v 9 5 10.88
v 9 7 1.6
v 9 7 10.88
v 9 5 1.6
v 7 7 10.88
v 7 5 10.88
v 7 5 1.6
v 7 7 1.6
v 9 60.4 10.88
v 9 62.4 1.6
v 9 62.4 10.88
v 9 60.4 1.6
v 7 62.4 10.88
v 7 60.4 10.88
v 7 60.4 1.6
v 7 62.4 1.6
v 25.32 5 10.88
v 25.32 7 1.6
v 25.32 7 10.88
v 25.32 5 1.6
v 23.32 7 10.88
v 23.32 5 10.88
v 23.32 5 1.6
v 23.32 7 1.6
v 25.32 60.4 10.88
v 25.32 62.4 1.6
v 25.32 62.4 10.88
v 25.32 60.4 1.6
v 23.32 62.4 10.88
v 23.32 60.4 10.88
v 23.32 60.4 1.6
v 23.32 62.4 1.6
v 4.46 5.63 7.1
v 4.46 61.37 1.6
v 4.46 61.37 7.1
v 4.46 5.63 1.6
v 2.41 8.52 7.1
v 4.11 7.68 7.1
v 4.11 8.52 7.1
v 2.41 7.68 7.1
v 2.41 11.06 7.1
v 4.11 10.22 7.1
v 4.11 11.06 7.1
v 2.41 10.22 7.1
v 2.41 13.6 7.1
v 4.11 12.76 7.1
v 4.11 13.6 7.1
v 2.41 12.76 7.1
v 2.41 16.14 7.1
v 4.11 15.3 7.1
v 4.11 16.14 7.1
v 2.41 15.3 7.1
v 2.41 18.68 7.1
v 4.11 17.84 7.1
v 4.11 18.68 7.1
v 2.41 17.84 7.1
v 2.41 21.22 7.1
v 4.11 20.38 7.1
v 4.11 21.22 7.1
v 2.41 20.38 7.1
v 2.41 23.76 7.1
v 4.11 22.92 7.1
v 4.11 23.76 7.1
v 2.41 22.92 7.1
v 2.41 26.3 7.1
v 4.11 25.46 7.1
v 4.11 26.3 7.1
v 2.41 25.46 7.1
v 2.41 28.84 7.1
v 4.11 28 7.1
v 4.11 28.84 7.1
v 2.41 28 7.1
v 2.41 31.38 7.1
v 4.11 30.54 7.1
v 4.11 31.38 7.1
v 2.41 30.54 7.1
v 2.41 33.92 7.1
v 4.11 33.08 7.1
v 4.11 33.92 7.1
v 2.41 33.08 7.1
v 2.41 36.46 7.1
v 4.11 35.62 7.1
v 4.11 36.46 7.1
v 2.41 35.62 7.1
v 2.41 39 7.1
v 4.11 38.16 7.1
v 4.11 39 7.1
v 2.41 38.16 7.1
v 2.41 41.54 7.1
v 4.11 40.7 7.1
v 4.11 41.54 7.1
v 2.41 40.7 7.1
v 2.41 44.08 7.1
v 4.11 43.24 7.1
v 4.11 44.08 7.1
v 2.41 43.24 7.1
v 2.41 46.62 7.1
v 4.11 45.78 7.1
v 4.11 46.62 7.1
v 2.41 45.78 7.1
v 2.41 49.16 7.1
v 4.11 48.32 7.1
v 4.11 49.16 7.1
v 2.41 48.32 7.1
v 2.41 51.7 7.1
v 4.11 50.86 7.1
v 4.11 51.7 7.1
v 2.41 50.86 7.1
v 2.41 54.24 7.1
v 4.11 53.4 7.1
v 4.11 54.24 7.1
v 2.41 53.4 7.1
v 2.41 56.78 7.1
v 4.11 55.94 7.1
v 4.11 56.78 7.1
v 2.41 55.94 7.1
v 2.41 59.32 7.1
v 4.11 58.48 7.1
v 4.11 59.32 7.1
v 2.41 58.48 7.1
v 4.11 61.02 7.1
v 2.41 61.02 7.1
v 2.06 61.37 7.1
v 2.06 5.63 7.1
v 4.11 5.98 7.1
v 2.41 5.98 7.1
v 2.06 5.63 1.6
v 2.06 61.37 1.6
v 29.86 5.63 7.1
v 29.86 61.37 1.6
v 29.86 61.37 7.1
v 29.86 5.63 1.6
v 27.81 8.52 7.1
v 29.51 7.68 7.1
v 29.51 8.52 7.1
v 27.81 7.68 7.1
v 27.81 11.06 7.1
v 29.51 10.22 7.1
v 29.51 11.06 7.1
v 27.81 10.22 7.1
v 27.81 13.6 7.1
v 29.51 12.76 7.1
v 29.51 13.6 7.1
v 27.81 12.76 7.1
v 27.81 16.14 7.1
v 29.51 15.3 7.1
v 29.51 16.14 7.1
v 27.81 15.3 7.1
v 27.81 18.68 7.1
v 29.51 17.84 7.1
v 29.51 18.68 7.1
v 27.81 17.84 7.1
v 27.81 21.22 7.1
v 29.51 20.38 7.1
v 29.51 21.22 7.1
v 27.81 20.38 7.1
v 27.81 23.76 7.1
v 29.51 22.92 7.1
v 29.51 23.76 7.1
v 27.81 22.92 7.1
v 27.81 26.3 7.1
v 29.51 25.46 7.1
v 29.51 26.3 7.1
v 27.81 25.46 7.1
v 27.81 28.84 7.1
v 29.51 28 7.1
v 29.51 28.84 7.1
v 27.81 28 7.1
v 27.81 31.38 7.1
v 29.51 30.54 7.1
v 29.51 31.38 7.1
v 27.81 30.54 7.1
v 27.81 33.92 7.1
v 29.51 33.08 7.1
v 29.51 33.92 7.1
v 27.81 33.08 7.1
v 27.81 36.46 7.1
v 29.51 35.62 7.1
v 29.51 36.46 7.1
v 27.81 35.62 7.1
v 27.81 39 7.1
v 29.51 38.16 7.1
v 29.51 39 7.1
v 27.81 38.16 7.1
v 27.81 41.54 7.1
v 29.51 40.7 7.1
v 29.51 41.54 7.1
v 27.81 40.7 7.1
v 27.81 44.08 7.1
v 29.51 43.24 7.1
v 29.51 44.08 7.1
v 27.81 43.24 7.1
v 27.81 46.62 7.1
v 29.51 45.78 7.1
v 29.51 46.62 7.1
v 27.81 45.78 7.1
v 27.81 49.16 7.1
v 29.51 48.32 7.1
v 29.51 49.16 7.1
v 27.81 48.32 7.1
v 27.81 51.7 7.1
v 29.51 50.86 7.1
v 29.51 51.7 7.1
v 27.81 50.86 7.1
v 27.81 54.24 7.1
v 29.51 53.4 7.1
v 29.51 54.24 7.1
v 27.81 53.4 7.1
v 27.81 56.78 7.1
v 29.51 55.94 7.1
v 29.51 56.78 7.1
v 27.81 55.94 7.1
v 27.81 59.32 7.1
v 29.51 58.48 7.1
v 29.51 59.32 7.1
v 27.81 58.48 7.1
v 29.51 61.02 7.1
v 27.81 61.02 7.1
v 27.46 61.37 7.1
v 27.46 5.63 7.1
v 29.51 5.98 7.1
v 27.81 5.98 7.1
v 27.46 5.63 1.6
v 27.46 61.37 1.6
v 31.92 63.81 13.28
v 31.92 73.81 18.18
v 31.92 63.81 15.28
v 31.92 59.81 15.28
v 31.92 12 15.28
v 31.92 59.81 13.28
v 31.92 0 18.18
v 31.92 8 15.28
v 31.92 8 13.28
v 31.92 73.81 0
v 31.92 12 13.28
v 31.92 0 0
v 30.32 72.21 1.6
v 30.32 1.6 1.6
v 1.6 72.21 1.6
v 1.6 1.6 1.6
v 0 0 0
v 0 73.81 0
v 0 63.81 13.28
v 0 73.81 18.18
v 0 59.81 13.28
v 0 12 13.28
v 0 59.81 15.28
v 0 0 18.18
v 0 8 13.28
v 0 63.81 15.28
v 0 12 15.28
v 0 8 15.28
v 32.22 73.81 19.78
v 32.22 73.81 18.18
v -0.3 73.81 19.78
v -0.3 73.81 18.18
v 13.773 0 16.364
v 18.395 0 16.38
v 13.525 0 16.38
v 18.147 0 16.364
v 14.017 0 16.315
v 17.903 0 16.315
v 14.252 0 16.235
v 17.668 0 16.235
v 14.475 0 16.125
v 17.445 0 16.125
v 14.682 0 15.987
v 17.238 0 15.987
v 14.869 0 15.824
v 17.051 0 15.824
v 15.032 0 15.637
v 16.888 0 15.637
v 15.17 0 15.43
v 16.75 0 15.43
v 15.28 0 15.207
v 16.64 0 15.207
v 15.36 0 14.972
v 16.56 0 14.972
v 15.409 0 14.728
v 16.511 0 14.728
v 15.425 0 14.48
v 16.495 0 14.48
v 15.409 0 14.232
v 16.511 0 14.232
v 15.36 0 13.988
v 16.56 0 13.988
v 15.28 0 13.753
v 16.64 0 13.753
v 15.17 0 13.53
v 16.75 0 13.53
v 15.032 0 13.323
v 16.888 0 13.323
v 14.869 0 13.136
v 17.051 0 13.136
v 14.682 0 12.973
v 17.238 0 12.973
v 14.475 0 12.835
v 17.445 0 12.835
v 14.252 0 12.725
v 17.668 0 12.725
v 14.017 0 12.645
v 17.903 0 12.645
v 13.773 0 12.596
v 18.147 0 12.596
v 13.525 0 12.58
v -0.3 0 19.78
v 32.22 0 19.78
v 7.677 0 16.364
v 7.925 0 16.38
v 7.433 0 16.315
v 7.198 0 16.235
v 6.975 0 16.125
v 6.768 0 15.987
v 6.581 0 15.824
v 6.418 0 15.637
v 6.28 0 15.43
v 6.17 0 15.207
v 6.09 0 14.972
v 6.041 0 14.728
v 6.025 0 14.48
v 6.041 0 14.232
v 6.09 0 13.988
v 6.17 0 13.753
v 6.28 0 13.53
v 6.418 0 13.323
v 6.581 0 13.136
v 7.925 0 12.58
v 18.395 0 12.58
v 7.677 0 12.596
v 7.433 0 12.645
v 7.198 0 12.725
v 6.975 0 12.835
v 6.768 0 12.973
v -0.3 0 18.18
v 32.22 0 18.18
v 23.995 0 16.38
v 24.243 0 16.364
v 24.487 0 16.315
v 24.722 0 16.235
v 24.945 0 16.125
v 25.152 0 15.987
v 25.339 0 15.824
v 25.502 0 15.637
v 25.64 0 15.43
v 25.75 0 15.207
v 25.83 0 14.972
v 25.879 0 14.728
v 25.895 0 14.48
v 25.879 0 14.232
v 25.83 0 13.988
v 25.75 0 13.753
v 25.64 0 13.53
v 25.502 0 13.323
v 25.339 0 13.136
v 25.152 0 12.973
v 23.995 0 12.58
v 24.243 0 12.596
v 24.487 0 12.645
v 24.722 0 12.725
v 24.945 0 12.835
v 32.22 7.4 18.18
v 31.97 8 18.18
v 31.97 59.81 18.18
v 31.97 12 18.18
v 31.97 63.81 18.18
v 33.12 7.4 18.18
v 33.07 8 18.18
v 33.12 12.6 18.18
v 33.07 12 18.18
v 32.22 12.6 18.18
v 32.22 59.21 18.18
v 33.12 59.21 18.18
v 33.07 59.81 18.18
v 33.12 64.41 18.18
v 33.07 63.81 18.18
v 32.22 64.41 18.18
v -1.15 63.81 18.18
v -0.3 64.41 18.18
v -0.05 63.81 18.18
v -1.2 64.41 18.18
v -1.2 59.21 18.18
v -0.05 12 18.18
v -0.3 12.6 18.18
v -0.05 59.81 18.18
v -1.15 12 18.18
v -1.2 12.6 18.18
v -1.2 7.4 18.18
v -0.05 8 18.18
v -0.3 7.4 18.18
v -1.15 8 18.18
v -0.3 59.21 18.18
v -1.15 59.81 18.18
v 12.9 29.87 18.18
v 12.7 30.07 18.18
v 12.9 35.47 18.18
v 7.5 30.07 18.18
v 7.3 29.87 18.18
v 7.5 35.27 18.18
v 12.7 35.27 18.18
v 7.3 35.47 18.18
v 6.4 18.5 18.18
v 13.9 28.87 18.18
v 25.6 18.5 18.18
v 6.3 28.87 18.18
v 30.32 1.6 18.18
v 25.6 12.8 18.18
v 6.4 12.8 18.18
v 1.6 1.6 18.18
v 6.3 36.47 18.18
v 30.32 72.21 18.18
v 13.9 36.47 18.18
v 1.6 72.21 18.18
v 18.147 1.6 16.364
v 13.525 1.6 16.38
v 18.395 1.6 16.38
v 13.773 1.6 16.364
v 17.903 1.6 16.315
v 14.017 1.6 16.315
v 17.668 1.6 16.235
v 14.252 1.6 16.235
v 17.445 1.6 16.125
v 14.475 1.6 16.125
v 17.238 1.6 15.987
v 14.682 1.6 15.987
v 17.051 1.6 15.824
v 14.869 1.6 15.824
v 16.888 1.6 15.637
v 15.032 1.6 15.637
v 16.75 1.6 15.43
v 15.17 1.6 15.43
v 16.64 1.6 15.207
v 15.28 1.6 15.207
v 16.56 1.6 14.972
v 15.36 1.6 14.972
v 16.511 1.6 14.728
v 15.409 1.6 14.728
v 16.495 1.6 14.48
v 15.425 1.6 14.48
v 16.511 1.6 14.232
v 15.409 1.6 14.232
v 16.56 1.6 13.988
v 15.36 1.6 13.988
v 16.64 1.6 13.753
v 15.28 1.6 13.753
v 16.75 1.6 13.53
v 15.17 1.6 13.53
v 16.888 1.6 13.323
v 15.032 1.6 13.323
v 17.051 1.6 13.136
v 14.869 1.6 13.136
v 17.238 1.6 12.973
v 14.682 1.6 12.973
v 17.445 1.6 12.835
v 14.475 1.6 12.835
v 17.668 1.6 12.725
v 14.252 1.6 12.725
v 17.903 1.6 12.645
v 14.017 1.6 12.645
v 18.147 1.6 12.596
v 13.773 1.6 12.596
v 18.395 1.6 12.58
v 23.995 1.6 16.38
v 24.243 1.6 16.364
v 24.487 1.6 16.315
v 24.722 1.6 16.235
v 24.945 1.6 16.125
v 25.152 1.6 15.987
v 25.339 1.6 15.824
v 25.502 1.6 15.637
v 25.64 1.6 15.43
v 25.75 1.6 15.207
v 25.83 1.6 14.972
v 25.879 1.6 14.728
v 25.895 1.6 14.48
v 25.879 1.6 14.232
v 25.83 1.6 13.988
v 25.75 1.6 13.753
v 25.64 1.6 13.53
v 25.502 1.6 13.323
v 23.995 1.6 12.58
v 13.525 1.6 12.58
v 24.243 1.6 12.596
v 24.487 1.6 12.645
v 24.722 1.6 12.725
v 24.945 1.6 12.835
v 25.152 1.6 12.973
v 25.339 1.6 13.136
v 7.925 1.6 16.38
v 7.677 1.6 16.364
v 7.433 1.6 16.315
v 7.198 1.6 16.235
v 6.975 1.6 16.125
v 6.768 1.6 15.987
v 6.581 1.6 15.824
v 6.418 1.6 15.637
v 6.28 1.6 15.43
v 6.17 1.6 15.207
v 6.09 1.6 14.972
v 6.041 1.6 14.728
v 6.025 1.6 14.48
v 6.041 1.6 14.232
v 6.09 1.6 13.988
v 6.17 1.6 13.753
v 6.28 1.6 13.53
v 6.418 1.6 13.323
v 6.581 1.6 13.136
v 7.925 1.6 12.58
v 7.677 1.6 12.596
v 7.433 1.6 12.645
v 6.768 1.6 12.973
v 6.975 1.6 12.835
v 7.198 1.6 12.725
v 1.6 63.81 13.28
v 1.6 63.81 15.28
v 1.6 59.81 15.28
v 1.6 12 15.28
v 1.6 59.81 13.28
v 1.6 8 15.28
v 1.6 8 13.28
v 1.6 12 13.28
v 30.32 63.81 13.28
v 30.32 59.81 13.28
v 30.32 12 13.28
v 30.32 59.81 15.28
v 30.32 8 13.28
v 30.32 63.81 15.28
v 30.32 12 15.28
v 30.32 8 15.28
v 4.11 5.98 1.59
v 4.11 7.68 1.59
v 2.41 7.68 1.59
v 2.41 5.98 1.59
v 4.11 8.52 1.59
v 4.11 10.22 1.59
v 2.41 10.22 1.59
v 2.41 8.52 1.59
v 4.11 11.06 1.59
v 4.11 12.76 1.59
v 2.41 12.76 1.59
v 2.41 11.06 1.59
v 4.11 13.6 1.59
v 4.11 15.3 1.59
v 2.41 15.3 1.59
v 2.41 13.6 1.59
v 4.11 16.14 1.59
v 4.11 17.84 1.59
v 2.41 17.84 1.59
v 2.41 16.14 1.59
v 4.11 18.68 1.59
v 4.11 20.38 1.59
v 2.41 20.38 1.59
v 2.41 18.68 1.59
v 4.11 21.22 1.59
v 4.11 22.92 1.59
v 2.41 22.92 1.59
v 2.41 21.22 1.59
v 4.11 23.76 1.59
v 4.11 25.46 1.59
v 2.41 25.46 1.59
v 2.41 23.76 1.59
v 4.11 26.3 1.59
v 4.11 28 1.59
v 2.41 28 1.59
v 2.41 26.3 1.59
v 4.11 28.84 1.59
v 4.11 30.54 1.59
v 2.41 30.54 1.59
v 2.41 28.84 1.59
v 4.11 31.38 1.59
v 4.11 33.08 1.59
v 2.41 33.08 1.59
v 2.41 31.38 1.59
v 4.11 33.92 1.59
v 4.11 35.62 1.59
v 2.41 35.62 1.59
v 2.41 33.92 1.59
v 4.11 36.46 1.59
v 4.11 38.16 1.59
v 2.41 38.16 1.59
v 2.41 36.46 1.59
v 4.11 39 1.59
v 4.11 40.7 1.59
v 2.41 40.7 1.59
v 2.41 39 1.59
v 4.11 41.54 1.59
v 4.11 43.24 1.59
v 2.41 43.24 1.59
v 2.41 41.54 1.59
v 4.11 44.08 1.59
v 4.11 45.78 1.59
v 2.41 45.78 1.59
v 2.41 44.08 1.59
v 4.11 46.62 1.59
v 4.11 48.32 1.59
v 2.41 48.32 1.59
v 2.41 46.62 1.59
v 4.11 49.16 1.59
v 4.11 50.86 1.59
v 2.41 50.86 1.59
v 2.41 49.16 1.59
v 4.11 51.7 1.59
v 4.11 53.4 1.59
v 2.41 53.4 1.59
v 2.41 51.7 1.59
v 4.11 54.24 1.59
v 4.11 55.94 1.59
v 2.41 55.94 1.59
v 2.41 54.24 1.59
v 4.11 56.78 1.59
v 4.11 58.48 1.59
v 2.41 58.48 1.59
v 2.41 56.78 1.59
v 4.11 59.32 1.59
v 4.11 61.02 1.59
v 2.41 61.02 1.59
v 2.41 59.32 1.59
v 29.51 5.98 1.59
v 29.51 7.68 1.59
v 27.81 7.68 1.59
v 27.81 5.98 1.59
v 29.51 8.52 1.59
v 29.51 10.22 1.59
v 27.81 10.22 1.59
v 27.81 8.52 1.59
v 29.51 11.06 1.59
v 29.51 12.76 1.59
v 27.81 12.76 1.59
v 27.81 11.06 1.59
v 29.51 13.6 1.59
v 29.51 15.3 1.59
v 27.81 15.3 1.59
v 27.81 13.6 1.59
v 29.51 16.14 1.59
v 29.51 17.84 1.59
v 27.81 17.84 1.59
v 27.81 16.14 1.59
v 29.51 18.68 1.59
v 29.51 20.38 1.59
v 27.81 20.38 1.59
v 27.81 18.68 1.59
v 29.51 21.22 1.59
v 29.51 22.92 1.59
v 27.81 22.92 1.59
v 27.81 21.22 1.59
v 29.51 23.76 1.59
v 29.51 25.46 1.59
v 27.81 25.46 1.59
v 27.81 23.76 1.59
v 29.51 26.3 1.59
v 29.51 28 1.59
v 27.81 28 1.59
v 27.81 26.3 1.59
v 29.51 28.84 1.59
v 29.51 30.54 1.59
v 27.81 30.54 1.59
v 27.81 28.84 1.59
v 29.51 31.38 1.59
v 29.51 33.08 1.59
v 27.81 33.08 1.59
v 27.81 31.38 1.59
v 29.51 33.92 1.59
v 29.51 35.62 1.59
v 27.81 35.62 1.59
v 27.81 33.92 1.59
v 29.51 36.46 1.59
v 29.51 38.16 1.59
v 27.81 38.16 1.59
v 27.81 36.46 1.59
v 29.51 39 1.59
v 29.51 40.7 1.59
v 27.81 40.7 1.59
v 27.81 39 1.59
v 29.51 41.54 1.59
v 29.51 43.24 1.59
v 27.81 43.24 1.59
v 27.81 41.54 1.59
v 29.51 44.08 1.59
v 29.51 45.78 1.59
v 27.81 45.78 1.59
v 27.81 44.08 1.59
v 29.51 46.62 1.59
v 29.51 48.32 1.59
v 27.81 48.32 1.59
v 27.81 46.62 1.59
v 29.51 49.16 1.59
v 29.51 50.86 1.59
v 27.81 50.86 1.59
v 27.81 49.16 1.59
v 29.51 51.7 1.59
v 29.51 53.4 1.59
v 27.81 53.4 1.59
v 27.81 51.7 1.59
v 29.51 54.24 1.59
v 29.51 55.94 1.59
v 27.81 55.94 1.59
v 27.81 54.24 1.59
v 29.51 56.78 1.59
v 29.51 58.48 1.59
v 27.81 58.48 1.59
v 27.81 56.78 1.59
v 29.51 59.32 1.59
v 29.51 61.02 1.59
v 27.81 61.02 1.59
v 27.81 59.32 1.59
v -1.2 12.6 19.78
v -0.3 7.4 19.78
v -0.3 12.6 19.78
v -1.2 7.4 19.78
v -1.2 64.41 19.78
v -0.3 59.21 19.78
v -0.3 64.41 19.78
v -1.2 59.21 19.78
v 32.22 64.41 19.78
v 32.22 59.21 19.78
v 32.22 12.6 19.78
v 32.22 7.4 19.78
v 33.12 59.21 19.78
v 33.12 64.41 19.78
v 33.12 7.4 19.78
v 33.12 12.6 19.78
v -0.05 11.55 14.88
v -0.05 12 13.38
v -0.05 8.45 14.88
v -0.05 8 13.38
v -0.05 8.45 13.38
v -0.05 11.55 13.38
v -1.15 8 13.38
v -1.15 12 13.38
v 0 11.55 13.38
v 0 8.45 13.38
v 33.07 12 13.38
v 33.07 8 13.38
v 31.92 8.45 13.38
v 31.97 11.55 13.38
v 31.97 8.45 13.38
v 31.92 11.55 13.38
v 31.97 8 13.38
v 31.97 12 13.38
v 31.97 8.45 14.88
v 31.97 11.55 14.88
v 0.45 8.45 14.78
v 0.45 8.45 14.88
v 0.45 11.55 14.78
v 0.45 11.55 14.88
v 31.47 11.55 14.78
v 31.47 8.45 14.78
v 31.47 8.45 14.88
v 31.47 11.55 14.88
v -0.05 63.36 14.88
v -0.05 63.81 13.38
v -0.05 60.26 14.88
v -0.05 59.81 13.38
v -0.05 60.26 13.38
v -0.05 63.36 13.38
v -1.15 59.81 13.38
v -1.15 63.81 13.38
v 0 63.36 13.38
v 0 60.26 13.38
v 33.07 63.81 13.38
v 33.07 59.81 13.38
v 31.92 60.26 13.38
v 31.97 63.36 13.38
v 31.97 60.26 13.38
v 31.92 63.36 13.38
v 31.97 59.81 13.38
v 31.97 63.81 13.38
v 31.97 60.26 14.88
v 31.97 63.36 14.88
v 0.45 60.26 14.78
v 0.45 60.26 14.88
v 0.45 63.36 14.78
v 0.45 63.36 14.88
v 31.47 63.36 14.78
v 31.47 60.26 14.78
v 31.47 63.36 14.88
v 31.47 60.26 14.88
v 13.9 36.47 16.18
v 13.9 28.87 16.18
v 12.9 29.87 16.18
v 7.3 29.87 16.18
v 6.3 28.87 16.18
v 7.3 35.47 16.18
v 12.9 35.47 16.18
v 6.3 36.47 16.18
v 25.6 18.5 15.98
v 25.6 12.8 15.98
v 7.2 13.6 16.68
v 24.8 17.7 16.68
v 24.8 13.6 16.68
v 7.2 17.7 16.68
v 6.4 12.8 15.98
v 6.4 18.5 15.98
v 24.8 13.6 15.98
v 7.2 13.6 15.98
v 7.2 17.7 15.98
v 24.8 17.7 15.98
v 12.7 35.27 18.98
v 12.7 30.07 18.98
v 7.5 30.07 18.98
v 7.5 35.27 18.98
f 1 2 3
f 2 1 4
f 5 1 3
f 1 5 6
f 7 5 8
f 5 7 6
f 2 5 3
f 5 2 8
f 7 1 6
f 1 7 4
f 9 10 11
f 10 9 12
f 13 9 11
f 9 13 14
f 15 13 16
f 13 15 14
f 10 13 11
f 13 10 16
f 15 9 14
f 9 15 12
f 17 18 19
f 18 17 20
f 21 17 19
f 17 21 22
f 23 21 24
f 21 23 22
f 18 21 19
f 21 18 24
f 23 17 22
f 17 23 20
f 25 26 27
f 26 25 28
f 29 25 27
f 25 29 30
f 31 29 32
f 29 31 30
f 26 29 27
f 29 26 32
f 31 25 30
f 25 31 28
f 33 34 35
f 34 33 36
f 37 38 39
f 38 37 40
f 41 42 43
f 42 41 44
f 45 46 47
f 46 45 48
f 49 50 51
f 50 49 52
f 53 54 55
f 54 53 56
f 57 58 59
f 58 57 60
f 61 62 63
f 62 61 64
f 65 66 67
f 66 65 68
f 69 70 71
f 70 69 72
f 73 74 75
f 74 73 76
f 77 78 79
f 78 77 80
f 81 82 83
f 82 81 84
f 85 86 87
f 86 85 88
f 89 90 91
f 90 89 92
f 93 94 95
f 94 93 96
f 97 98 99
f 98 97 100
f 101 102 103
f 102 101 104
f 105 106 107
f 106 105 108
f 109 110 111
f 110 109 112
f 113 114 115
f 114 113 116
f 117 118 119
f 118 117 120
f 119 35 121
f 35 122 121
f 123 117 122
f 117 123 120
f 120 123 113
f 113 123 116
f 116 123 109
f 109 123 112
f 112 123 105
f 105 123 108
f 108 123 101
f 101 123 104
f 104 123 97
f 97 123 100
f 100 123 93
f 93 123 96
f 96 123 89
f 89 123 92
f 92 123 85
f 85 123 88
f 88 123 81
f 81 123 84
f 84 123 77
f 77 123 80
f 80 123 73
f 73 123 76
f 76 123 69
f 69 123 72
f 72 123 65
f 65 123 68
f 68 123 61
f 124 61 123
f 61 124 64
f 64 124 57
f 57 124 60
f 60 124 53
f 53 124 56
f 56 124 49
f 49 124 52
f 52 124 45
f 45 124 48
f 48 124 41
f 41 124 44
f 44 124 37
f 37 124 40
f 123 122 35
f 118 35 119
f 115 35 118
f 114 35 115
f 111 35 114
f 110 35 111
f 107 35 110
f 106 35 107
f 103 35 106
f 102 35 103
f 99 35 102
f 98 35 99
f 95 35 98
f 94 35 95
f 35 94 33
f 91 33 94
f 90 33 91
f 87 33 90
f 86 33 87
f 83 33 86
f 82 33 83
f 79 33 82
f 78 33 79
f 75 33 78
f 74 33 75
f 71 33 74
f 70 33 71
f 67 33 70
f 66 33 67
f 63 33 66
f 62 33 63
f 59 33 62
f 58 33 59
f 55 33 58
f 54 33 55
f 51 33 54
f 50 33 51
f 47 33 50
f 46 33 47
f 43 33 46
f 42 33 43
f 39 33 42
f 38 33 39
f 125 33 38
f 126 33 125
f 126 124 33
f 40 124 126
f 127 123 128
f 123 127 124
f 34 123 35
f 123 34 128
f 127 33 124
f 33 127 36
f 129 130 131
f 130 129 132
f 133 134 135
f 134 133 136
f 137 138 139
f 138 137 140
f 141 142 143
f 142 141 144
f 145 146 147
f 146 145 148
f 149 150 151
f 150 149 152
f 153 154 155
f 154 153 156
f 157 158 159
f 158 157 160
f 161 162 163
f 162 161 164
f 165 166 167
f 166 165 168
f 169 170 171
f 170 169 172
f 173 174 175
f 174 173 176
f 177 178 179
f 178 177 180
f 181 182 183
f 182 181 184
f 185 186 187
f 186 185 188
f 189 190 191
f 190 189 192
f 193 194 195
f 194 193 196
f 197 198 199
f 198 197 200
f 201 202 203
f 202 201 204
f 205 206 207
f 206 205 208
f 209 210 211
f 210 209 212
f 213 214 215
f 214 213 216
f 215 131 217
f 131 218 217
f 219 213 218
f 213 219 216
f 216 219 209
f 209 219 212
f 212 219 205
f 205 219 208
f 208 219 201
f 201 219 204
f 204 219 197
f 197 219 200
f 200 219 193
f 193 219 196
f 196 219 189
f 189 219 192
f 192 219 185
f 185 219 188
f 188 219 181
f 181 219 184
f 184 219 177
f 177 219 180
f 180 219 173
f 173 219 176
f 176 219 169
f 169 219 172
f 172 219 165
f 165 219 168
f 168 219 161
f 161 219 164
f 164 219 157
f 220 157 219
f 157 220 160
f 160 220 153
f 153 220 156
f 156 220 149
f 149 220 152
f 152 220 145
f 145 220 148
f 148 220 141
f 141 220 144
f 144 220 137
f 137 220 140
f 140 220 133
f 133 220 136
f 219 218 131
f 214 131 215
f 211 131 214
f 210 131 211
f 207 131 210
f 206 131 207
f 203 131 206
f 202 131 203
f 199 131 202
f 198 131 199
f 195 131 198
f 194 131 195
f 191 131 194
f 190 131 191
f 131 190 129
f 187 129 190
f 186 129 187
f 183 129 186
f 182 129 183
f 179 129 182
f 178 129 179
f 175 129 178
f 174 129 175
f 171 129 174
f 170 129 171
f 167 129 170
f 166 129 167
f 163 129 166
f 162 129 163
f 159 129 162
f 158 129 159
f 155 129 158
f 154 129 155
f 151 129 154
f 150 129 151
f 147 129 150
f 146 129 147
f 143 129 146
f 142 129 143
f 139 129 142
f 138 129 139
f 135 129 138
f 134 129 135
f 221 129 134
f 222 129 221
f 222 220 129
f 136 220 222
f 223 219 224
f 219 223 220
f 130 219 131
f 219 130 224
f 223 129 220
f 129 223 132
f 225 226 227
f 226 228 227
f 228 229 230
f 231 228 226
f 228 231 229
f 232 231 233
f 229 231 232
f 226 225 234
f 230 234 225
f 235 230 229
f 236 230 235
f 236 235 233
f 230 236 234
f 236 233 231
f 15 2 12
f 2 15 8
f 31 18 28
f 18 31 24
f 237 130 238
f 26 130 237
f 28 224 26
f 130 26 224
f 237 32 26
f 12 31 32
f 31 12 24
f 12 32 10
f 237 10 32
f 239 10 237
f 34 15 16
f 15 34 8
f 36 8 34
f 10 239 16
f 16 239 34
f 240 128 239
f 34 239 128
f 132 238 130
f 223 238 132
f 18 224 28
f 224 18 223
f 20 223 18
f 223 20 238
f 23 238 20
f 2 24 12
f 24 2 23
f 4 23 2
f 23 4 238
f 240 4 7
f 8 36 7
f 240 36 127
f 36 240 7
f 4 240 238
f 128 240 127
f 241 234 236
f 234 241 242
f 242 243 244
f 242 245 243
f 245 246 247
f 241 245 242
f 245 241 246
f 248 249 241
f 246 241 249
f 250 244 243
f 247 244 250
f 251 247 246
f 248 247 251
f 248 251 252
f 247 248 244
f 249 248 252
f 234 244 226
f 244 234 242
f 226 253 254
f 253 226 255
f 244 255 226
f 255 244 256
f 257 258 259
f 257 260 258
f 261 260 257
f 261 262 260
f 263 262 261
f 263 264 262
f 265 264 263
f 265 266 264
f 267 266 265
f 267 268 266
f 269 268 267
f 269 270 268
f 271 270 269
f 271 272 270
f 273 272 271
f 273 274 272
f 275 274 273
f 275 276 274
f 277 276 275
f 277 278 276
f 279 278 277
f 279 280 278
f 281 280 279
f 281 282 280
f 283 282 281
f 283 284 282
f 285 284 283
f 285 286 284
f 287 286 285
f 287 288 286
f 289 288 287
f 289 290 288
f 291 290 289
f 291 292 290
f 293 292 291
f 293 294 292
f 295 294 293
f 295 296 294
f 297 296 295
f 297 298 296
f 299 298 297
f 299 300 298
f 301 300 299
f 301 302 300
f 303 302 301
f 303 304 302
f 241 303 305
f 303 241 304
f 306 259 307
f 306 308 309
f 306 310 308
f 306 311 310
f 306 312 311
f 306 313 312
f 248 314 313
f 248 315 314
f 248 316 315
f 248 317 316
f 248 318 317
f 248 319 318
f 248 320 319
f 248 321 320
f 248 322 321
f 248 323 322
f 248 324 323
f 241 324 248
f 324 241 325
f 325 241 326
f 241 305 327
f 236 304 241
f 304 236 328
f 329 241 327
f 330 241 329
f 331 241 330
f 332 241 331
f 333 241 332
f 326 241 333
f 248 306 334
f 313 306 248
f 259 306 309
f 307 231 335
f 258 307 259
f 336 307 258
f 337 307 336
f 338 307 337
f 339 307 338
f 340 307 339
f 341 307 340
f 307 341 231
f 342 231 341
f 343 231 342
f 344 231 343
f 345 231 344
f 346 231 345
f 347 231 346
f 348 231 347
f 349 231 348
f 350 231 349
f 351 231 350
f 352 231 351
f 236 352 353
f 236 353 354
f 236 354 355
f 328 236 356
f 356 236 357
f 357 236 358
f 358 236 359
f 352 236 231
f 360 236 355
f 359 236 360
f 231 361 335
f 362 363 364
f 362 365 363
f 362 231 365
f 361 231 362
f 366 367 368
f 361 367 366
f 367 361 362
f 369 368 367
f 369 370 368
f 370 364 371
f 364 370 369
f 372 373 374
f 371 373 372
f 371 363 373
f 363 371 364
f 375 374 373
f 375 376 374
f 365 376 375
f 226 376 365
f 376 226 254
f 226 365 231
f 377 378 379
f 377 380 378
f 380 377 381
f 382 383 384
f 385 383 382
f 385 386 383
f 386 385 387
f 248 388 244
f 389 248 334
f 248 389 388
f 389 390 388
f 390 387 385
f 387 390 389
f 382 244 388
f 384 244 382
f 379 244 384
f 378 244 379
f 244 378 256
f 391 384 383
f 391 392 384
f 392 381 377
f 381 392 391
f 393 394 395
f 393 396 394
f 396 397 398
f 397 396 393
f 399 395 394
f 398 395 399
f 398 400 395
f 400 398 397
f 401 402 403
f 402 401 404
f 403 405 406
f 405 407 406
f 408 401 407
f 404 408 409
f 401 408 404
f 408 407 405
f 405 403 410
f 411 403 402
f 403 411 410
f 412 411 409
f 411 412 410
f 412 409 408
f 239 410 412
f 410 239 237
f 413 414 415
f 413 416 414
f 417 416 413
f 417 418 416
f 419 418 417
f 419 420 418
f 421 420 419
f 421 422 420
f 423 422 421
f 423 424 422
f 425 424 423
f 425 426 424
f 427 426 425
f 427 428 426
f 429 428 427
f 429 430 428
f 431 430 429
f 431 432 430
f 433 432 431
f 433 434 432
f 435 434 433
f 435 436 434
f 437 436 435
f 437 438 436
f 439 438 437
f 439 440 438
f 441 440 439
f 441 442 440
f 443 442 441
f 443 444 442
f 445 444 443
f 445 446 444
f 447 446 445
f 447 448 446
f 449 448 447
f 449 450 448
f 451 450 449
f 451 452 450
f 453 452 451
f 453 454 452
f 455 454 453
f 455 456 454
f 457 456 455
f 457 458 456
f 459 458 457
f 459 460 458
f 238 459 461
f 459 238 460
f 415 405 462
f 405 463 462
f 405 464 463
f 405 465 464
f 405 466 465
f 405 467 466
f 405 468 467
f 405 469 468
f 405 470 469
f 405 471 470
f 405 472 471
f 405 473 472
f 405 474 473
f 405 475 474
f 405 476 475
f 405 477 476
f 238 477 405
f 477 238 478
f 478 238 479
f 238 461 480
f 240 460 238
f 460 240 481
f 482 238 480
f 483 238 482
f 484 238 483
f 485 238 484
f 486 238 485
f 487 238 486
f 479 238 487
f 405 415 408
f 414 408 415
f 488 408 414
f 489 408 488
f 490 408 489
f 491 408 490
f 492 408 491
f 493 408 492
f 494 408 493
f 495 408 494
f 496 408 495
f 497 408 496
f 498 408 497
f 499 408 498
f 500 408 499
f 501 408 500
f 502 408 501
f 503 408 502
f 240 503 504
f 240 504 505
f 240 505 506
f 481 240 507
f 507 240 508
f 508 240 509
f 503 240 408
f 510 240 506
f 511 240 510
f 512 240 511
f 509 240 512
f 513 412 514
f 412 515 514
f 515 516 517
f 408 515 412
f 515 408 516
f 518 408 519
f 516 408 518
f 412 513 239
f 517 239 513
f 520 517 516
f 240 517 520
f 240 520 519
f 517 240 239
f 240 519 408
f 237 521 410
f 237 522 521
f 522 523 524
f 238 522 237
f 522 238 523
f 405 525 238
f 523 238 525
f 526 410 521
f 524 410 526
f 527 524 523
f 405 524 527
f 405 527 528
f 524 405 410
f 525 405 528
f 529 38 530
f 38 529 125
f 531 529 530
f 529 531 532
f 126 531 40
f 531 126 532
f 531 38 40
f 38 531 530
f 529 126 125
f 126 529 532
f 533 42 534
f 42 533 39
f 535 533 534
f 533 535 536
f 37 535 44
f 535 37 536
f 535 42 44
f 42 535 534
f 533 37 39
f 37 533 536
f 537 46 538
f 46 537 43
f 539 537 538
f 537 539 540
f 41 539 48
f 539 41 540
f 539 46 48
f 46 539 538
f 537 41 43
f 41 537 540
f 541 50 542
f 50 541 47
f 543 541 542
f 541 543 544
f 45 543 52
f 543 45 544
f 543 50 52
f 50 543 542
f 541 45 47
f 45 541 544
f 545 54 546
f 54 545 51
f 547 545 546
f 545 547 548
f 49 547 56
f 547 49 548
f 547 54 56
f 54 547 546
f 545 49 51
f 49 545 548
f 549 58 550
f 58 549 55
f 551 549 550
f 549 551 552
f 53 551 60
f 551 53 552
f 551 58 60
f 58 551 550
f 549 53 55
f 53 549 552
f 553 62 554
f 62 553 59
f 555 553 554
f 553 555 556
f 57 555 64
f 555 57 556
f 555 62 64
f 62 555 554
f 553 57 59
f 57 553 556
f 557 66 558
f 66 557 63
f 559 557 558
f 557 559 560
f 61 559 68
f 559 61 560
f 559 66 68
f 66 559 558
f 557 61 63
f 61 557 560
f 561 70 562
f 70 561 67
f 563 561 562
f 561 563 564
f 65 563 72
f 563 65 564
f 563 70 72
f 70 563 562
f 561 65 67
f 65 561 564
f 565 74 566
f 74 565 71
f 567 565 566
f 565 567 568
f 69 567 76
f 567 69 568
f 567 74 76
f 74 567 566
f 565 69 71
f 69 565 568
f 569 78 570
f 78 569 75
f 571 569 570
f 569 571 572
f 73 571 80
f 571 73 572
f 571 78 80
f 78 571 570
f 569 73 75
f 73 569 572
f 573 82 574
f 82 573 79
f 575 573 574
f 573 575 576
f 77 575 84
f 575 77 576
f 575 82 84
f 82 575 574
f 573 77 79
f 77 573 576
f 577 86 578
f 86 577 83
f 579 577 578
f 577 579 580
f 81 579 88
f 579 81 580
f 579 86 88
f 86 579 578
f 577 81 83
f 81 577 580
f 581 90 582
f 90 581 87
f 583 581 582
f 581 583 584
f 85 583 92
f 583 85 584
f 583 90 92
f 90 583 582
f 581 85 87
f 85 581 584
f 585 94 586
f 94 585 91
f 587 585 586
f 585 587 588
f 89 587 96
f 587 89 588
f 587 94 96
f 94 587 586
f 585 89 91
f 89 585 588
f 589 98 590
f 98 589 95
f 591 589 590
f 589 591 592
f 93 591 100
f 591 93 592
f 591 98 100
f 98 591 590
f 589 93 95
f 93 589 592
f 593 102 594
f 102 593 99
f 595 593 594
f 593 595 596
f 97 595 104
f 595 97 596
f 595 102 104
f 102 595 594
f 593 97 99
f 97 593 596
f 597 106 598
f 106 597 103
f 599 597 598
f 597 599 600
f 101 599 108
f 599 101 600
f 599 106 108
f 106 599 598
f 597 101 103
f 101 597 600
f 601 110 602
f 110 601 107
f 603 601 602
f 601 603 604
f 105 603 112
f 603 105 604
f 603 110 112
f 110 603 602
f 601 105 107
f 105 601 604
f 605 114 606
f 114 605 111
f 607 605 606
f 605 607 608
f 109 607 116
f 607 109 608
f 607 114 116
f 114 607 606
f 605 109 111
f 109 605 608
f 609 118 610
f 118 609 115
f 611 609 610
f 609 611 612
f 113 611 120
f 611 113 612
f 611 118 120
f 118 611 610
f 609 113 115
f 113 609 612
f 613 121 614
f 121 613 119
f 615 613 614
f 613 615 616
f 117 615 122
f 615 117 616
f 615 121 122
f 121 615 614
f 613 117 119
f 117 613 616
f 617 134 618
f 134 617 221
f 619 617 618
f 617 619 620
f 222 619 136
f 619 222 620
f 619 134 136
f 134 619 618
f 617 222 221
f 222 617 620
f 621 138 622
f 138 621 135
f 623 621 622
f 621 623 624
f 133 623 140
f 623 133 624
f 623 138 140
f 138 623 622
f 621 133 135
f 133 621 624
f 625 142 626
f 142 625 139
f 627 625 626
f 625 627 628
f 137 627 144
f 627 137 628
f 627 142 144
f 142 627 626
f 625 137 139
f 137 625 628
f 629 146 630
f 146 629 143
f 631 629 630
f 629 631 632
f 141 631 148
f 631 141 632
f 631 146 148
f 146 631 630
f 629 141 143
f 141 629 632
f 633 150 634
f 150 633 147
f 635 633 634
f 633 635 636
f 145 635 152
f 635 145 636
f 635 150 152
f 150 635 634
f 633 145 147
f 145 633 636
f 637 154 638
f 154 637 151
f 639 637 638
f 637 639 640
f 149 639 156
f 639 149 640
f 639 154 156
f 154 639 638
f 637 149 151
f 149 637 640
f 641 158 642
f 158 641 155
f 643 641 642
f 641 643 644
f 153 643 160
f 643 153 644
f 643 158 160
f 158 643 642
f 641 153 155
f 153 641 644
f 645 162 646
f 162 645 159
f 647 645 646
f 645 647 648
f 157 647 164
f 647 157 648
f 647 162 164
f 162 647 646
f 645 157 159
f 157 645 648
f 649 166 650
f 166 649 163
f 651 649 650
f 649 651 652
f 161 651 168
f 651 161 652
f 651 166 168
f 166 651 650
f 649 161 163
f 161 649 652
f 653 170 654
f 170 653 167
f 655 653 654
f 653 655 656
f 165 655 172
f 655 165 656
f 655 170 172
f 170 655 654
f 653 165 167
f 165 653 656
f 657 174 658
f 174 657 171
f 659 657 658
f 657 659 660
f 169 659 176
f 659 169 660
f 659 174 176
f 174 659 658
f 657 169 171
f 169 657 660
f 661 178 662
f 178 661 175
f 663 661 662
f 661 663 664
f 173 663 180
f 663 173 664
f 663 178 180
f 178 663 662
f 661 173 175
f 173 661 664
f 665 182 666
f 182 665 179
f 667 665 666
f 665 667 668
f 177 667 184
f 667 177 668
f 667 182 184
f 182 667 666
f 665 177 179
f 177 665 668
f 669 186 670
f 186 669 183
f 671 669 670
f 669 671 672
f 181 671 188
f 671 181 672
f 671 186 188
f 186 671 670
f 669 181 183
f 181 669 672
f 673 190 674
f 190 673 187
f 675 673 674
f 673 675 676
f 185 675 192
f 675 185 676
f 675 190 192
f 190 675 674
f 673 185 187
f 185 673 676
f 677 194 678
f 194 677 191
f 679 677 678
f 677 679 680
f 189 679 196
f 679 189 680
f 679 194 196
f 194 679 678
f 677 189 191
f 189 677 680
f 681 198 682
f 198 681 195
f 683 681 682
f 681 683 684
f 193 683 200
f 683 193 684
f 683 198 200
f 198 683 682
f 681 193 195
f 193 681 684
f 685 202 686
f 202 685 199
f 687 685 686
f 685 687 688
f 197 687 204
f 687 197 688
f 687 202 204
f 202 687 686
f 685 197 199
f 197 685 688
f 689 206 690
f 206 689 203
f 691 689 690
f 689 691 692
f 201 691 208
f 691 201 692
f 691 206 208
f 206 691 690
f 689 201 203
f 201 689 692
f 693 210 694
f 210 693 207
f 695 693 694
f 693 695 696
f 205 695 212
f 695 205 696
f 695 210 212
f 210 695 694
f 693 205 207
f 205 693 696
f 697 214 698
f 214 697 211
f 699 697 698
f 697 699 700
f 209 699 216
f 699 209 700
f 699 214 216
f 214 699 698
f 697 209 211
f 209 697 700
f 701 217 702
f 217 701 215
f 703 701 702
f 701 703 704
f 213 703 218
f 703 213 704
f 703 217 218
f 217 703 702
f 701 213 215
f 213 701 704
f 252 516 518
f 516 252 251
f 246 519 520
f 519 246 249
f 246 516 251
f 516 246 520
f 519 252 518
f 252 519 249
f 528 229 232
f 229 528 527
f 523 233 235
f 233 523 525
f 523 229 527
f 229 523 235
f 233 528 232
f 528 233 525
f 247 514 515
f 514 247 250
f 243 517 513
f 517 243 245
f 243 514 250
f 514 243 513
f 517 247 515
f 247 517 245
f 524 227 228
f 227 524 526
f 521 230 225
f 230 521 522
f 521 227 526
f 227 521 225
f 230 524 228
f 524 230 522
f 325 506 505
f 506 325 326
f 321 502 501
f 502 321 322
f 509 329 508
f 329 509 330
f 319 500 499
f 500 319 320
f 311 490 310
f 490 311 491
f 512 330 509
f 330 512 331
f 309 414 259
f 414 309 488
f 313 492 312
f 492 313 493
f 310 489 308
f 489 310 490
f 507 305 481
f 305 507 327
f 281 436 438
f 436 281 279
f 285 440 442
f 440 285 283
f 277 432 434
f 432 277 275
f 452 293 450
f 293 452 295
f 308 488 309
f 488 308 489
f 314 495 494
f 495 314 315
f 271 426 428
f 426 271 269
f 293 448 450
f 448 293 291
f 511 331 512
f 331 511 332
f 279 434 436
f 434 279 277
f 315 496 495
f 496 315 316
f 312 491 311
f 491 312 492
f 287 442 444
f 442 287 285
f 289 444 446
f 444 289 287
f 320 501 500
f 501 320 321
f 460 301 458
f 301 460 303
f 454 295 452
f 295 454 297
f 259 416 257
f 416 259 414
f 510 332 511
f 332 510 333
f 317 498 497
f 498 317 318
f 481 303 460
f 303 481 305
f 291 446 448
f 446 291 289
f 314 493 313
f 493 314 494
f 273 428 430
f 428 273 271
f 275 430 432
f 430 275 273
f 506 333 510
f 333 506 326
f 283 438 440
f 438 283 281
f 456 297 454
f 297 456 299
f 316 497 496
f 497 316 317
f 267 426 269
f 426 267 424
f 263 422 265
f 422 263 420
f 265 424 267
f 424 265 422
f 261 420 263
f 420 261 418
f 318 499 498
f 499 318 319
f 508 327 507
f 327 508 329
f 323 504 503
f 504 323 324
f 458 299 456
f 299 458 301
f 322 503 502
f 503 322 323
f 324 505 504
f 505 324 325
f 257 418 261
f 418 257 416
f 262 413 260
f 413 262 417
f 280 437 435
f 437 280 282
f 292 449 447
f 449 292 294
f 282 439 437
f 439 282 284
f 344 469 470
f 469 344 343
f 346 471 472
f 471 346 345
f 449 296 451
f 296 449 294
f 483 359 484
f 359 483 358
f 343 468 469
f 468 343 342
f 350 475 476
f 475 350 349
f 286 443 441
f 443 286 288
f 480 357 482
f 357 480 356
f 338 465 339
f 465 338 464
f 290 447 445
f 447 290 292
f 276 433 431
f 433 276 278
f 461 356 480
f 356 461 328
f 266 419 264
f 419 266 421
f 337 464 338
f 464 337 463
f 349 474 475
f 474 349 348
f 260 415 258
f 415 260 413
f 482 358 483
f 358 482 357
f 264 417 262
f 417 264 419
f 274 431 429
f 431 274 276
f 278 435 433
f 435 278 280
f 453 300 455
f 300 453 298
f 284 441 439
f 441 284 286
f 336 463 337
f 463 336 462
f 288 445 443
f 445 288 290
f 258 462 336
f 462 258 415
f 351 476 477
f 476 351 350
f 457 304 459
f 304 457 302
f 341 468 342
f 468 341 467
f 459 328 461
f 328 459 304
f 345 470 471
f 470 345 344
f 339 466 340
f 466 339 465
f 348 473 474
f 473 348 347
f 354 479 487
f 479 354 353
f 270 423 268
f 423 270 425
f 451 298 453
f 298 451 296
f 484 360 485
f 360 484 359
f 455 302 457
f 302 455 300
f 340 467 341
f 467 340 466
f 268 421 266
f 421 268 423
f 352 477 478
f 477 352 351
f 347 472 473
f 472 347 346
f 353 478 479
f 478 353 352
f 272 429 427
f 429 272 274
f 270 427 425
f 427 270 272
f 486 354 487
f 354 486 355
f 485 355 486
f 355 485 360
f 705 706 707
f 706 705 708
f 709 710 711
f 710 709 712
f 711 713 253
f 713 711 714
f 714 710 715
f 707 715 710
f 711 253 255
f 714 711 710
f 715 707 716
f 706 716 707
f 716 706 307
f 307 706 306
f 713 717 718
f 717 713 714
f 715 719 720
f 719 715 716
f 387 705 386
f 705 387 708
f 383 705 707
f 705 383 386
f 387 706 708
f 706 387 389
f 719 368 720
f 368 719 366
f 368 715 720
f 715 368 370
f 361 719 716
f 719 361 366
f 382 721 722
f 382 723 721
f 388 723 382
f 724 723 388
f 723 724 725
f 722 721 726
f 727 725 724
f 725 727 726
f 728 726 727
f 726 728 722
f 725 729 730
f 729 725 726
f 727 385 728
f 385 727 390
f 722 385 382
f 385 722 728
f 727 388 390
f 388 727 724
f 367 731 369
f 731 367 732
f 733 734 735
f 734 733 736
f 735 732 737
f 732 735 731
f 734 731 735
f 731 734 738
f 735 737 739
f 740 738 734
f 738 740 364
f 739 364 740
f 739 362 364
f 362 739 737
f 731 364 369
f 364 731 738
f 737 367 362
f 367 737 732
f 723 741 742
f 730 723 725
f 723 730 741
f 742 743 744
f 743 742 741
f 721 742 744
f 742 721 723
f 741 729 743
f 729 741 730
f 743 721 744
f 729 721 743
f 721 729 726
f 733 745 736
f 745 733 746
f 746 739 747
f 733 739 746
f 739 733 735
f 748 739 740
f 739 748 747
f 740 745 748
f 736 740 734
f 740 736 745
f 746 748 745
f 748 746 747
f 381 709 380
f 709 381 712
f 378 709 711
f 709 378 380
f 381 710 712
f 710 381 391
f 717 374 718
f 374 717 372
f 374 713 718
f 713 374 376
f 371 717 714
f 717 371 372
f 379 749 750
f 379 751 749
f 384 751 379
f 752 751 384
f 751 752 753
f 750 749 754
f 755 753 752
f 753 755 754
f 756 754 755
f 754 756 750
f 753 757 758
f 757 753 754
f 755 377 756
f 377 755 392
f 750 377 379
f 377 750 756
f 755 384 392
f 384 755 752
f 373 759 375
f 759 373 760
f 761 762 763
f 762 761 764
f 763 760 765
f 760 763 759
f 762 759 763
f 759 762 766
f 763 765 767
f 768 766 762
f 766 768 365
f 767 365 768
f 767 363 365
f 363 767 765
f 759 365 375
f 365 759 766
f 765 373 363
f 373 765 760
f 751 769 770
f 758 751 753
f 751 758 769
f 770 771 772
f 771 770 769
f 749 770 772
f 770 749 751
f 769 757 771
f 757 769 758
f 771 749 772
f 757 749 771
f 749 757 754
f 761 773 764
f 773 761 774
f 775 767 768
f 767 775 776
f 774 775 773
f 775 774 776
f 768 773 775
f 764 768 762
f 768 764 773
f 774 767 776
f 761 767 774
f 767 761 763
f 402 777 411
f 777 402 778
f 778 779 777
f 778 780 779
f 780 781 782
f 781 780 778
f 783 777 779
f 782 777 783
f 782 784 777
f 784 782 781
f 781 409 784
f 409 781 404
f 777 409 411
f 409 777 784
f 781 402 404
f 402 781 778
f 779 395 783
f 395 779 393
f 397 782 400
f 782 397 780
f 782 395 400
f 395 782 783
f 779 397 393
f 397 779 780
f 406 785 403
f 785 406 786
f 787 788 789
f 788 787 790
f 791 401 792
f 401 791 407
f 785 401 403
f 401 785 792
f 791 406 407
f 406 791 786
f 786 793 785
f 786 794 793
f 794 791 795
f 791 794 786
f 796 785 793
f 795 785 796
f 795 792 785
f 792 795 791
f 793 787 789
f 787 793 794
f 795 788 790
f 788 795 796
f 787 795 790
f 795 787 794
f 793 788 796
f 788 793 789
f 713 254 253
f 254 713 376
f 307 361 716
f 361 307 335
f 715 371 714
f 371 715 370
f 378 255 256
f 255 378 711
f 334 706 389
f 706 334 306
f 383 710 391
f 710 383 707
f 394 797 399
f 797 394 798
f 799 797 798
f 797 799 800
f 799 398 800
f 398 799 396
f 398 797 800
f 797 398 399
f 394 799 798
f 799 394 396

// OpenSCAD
/*
 * YN038 ESP32-S3 开发板卡扣式外壳（PLA，V2）
 *
 * 已实测：PCB 63.00 x 27.92 x 1.61 mm；背面排针突出 8.58 mm；
 * 正面 USB-C 最高 4.88 mm。双 USB-C 位于 y=0 的短边。
 *
 * 导出：将 part 改为 "base" 或 "lid"，F6 渲染后导出 STL。
 */

$fn = 48;

part = "assembly"; // [assembly,base,lid,collision]

pcb_w = 27.92;
pcb_l = 63.00;
pcb_t = 1.61;
module_overhang = 6.81;
module_l = 25.50;
module_w = 18.00;
module_top_h = 4.77;
pin_drop = 8.58;
assembly_top_h = 4.88; // PCB 底面到 USB-C 最高点的实测总高度

clearance_xy = 0.40;
clearance_top = 0.90;
wall = 1.60;
floor_t = 1.60;
usb_interface_h = 2.56;
usb_opening_w = 9.40;
usb_opening_h = 3.80;
usb_center_pitch = 10.47;
usb_top_bridge = 1.80;
g3_led_size = 5.00;
g3_led_clearance = 0.20;
g3_window_t = 0.80;
g3_well_inner = 5.60;
g3_well_wall = 1.00;
g3_well_depth = 2.00;
pin_rail_w = 2.40;
pin_guide_h = 5.50;

// PCB 由支柱托住，背面排针尖端距壳底保留 0.70 mm 安全余量。
board_z = floor_t + pin_drop + 0.70;
usb_center_z = board_z + assembly_top_h - usb_interface_h / 2;
usb_window_z = usb_center_z - usb_opening_h / 2;
rim_h = max(
    board_z + assembly_top_h + clearance_top,
    usb_window_z + usb_opening_h + usb_top_bridge
);

outer_w = pcb_w + 2 * (wall + clearance_xy);
outer_l = pcb_l + module_overhang + 2 * (wall + clearance_xy);

board_x = wall + clearance_xy;
board_y = wall + clearance_xy;

/* 生成闭合的底壳：四侧有壁，仅在前端精确开出两个 USB-C 窗口。 */
module base_shell() {
    difference() {
        union() {
            cube([outer_w, outer_l, floor_t]);
            translate([0, outer_l - wall, 0]) cube([outer_w, wall, rim_h]);
            cube([outer_w, wall, rim_h]);
            cube([wall, outer_l, rim_h]);
            translate([outer_w - wall, 0, 0]) cube([wall, outer_l, rim_h]);
            board_standoffs();
            pin_guide_rails();
        }
        pin_pockets();
        snap_receiver_slots();
        usb_windows();
    }
}

/* 两条低矮导轨包围针脚下段，顶部避开排针塑胶座并形成真实盲槽实体。 */
module pin_guide_rails() {
    first_pin_y = board_y + 4.83;
    last_pin_y = first_pin_y + 21 * 2.54;
    rail_y = first_pin_y - pin_rail_w / 2;
    rail_l = last_pin_y - first_pin_y + pin_rail_w;
    for (x = [board_x + 1.26, board_x + pcb_w - 1.26])
        translate([x - pin_rail_w / 2, rail_y, floor_t - 0.01])
            cube([pin_rail_w, rail_l, pin_guide_h + 0.01]);
}

/* 在四角托住 PCB，避免压到背面的排针焊脚和焊点。 */
module board_standoffs() {
    for (x = [board_x + 5.0, board_x + pcb_w - 6.6])
        for (y = [board_y + 3.0, board_y + pcb_l - 4.6])
            translate([x, y, floor_t - 0.01])
                cube([2.0, 2.0, pin_drop + 0.71]);
}

/* 从实体导轨中切出两排 22 个盲槽；壳底仍保留完整的 1.59 mm 封闭层。 */
module pin_pockets() {
    pin_row_x = [board_x + 1.26, board_x + pcb_w - 1.26];
    for (x = pin_row_x)
        for (i = [0 : 21])
            translate([x - 0.85, board_y + 4.83 + i * 2.54 - 0.85, floor_t - 0.01])
                cube([1.70, 1.70, board_z - floor_t + 0.02]);
}

/* 用整板、模组凸出段和 44 根方针构造参考体，避免漏查天线端与顶面干涉。 */
module board_reference() {
    union() {
        translate([board_x, board_y, board_z])
            cube([pcb_w, pcb_l, assembly_top_h]);
        translate([
            board_x + (pcb_w - module_w) / 2,
            board_y + pcb_l - (module_l - module_overhang),
            board_z
        ]) cube([module_w, module_l, module_top_h]);
        for (x = [board_x + 1.26, board_x + pcb_w - 1.26])
            for (i = [0 : 21])
                translate([x - 0.32, board_y + 4.83 + i * 2.54 - 0.32, board_z - pin_drop])
                    cube([0.64, 0.64, pin_drop]);
    }
}

/* 前端仅保留两个 USB-C 插口；按插头外轮廓使用胶囊形圆角长孔。 */
module usb_windows() {
    for (center_x = [
        outer_w / 2 - usb_center_pitch / 2,
        outer_w / 2 + usb_center_pitch / 2
    ])
        rounded_usb_window(
            center_x - usb_opening_w / 2,
            usb_window_z,
            usb_opening_w,
            usb_opening_h
        );
}

/* 用两个等半径圆柱的凸包生成标准胶囊孔，截面为直边加左右完整半圆。 */
module rounded_usb_window(x, z, width, height) {
    radius = height / 2;
    hull() {
        translate([x + radius, -0.01, z + radius])
            rotate([-90, 0, 0]) cylinder(h = board_y + 0.02, r = radius);
        translate([x + width - radius, -0.01, z + radius])
            rotate([-90, 0, 0]) cylinder(h = board_y + 0.02, r = radius);
    }
}

/* 底壳侧壁的卡扣接收孔，和顶盖的弹性卡舌配合。 */
module snap_receiver_slots() {
    for (y = [8, outer_l - 14]) {
        translate([-0.1, y, rim_h - 4.9]) cube([wall + 0.3, 4.0, 2.0]);
        translate([outer_w - wall - 0.2, y, rim_h - 4.9])
            cube([wall + 0.3, 4.0, 2.0]);
    }
}

/* 生成封闭式半透明顶盖，G3 使用薄窗和内置光井显示状态。 */
module lid() {
    difference() {
        union() {
            translate([-0.30, 0, rim_h]) cube([outer_w + 0.60, outer_l, wall]);
            lid_skirt_and_latches();
            lid_internal_optics();
        }
        g3_window_recess();
    }
}

/* 顶盖四个长弹片扣入底壳孔位；PLA 使用宽弹片降低折断风险。 */
module lid_skirt_and_latches() {
    for (y = [8, outer_l - 14]) {
        // 局部根座覆盖整片卡舌宽度，卡舌再贯穿整个顶板厚度，避免薄边点接触。
        translate([-1.20, y - 0.60, rim_h]) cube([1.20, 5.20, wall]);
        translate([outer_w, y - 0.60, rim_h]) cube([1.20, 5.20, wall]);
        // 弹片位于底壳外侧，避免占用 PCB 两侧仅 0.40 mm 的装配间隙。
        translate([-1.15, y, rim_h - 4.8]) cube([1.10, 4.0, 4.8 + wall]);
        translate([outer_w + 0.05, y, rim_h - 4.8]) cube([1.10, 4.0, 4.8 + wall]);
        // 0.45 mm 楔形钩带导入斜坡，压盖时逐渐外张，降低 PLA 折断风险。
        hull() {
            translate([-0.10, y + 0.45, rim_h - 4.8]) cube([0.10, 3.1, 0.10]);
            translate([-0.10, y + 0.45, rim_h - 3.4]) cube([0.55, 3.1, 0.10]);
        }
        hull() {
            translate([outer_w, y + 0.45, rim_h - 4.8]) cube([0.10, 3.1, 0.10]);
            translate([outer_w - 0.45, y + 0.45, rim_h - 3.4])
                cube([0.55, 3.1, 0.10]);
        }
    }
}

/* 从内侧减薄 G3 区域，外表面保留 0.80 mm 封闭磨砂透光窗。 */
module g3_window_recess() {
    g3_center_x = board_x + 8.10;
    // 实测：天线侧主 PCB 边到灯珠左沿 29.83 mm；换算到 USB 端中心为 30.67 mm。
    g3_center_y = board_y + 30.67;
    g3_hole = g3_led_size + g3_led_clearance;

    translate([
        g3_center_x - g3_hole / 2,
        g3_center_y - g3_hole / 2,
        rim_h - 0.1
    ]) cube([g3_hole, g3_hole, wall - g3_window_t + 0.1]);
}

/* 光井减少 G3 视差；加厚顶和围墙抑制 PWR/TX/RX 红光在半透明顶盖内扩散。 */
module lid_internal_optics() {
    g3_center_x = board_x + 8.10;
    g3_center_y = board_y + 30.67;
    g3_well_outer = g3_well_inner + 2 * g3_well_wall;
    pwr_x = board_x + 4.40;
    pwr_y = board_y + 10.80;
    pwr_w = 19.20;
    pwr_l = 5.70;
    pwr_roof_extra = 1.50;
    pwr_wall_depth = 2.20;
    pwr_wall_t = 0.80;

    difference() {
        translate([
            g3_center_x - g3_well_outer / 2,
            g3_center_y - g3_well_outer / 2,
            rim_h - g3_well_depth
        ]) cube([g3_well_outer, g3_well_outer, g3_well_depth + 0.01]);
        translate([
            g3_center_x - g3_well_inner / 2,
            g3_center_y - g3_well_inner / 2,
            rim_h - g3_well_depth - 0.01
        ]) cube([g3_well_inner, g3_well_inner, g3_well_depth + 0.03]);
    }

    translate([pwr_x, pwr_y, rim_h - pwr_roof_extra])
        cube([pwr_w, pwr_l, pwr_roof_extra + 0.01]);
    translate([pwr_x, pwr_y, rim_h - pwr_wall_depth])
        cube([pwr_w, pwr_wall_t, pwr_wall_depth + 0.01]);
    translate([pwr_x, pwr_y + pwr_l - pwr_wall_t, rim_h - pwr_wall_depth])
        cube([pwr_w, pwr_wall_t, pwr_wall_depth + 0.01]);
    translate([pwr_x, pwr_y, rim_h - pwr_wall_depth])
        cube([pwr_wall_t, pwr_l, pwr_wall_depth + 0.01]);
    translate([pwr_x + pwr_w - pwr_wall_t, pwr_y, rim_h - pwr_wall_depth])
        cube([pwr_wall_t, pwr_l, pwr_wall_depth + 0.01]);
}

/* 以不同颜色展示合盖后的相对位置，供 OpenSCAD 预览和尺寸检查。 */
module show_assembly() {
    color("dimgray") base_shell();
    color("gainsboro") lid();
}

/* 同时检查板卡、底壳与顶盖的实体重叠；正确设计应导出为空几何。 */
module collision_check() {
    union() {
        intersection() {
            base_shell();
            translate([0, 0, 0.05]) lid();
        }
        intersection() {
            base_shell();
            translate([0, 0, 0.05]) board_reference();
        }
        intersection() {
            translate([0, 0, 0.05]) lid();
            board_reference();
        }
    }
}

if (part == "base")
    base_shell();
else if (part == "lid")
    // 顶盖导出时翻转，外表面贴打印平台，卡扣朝上且无需支撑。
    translate([0, outer_l, rim_h + wall]) rotate([180, 0, 0]) lid();
else if (part == "collision")
    collision_check();
else
    show_assembly();
